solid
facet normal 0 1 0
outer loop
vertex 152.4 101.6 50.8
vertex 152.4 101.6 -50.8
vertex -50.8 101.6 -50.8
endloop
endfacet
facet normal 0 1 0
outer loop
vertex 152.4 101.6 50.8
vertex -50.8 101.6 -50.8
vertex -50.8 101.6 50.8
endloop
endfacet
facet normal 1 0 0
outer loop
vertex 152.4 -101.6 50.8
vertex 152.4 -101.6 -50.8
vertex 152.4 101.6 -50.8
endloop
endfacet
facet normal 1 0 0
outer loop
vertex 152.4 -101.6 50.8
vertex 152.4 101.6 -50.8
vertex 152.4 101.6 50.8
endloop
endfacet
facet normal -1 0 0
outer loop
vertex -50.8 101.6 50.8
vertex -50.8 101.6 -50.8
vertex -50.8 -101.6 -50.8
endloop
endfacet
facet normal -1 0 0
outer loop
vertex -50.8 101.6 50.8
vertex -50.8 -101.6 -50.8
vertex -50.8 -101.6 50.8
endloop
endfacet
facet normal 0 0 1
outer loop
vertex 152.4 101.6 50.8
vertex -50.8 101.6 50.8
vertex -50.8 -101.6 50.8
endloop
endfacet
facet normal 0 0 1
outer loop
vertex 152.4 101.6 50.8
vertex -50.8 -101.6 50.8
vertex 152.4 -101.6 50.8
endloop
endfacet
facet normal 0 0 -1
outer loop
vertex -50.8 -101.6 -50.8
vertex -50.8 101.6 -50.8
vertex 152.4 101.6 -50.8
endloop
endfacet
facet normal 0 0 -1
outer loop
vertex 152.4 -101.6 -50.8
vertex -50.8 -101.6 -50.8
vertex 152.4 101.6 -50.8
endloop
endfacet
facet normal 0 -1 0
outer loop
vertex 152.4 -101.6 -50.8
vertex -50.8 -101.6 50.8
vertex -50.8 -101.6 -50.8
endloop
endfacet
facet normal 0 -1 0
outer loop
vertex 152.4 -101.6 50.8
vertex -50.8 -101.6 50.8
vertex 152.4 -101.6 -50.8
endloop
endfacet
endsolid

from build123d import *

# Parameters (mm, degrees)
F1_W     = 101.6
F1_H     = 101.6
F2_DEPTH = 101.6
F3_W     = 101.6
F3_H     = 101.6
F4_DEPTH = 101.6
F5_W     = 101.6
F5_H     = 101.6
F6_DEPTH = 101.6


# Not quite as in the source:
# - a variable given as a bare number and used for a length is read in inches; the dataset says mm whatever the document's units were


with BuildPart() as f2:
    # F1 (on Front) → F2 (new body, symmetric)
    with BuildSketch(Plane.XZ):
        Rectangle(F1_W, F1_H)
    extrude(amount=F2_DEPTH, both=True)

    # F3 (on face) → F4 (join)
    with BuildSketch(Plane.YZ.offset(50.8)):
        with Locations((50.8, 0)):
            Rectangle(F3_W, F3_H)
    extrude(amount=F4_DEPTH)

    # F5 (on face) → F6 (join)
    with BuildSketch(Plane.XZ):
        with Locations((101.6, 0)):
            Rectangle(F5_W, F5_H)
    extrude(amount=F6_DEPTH)


solid = f2.part
